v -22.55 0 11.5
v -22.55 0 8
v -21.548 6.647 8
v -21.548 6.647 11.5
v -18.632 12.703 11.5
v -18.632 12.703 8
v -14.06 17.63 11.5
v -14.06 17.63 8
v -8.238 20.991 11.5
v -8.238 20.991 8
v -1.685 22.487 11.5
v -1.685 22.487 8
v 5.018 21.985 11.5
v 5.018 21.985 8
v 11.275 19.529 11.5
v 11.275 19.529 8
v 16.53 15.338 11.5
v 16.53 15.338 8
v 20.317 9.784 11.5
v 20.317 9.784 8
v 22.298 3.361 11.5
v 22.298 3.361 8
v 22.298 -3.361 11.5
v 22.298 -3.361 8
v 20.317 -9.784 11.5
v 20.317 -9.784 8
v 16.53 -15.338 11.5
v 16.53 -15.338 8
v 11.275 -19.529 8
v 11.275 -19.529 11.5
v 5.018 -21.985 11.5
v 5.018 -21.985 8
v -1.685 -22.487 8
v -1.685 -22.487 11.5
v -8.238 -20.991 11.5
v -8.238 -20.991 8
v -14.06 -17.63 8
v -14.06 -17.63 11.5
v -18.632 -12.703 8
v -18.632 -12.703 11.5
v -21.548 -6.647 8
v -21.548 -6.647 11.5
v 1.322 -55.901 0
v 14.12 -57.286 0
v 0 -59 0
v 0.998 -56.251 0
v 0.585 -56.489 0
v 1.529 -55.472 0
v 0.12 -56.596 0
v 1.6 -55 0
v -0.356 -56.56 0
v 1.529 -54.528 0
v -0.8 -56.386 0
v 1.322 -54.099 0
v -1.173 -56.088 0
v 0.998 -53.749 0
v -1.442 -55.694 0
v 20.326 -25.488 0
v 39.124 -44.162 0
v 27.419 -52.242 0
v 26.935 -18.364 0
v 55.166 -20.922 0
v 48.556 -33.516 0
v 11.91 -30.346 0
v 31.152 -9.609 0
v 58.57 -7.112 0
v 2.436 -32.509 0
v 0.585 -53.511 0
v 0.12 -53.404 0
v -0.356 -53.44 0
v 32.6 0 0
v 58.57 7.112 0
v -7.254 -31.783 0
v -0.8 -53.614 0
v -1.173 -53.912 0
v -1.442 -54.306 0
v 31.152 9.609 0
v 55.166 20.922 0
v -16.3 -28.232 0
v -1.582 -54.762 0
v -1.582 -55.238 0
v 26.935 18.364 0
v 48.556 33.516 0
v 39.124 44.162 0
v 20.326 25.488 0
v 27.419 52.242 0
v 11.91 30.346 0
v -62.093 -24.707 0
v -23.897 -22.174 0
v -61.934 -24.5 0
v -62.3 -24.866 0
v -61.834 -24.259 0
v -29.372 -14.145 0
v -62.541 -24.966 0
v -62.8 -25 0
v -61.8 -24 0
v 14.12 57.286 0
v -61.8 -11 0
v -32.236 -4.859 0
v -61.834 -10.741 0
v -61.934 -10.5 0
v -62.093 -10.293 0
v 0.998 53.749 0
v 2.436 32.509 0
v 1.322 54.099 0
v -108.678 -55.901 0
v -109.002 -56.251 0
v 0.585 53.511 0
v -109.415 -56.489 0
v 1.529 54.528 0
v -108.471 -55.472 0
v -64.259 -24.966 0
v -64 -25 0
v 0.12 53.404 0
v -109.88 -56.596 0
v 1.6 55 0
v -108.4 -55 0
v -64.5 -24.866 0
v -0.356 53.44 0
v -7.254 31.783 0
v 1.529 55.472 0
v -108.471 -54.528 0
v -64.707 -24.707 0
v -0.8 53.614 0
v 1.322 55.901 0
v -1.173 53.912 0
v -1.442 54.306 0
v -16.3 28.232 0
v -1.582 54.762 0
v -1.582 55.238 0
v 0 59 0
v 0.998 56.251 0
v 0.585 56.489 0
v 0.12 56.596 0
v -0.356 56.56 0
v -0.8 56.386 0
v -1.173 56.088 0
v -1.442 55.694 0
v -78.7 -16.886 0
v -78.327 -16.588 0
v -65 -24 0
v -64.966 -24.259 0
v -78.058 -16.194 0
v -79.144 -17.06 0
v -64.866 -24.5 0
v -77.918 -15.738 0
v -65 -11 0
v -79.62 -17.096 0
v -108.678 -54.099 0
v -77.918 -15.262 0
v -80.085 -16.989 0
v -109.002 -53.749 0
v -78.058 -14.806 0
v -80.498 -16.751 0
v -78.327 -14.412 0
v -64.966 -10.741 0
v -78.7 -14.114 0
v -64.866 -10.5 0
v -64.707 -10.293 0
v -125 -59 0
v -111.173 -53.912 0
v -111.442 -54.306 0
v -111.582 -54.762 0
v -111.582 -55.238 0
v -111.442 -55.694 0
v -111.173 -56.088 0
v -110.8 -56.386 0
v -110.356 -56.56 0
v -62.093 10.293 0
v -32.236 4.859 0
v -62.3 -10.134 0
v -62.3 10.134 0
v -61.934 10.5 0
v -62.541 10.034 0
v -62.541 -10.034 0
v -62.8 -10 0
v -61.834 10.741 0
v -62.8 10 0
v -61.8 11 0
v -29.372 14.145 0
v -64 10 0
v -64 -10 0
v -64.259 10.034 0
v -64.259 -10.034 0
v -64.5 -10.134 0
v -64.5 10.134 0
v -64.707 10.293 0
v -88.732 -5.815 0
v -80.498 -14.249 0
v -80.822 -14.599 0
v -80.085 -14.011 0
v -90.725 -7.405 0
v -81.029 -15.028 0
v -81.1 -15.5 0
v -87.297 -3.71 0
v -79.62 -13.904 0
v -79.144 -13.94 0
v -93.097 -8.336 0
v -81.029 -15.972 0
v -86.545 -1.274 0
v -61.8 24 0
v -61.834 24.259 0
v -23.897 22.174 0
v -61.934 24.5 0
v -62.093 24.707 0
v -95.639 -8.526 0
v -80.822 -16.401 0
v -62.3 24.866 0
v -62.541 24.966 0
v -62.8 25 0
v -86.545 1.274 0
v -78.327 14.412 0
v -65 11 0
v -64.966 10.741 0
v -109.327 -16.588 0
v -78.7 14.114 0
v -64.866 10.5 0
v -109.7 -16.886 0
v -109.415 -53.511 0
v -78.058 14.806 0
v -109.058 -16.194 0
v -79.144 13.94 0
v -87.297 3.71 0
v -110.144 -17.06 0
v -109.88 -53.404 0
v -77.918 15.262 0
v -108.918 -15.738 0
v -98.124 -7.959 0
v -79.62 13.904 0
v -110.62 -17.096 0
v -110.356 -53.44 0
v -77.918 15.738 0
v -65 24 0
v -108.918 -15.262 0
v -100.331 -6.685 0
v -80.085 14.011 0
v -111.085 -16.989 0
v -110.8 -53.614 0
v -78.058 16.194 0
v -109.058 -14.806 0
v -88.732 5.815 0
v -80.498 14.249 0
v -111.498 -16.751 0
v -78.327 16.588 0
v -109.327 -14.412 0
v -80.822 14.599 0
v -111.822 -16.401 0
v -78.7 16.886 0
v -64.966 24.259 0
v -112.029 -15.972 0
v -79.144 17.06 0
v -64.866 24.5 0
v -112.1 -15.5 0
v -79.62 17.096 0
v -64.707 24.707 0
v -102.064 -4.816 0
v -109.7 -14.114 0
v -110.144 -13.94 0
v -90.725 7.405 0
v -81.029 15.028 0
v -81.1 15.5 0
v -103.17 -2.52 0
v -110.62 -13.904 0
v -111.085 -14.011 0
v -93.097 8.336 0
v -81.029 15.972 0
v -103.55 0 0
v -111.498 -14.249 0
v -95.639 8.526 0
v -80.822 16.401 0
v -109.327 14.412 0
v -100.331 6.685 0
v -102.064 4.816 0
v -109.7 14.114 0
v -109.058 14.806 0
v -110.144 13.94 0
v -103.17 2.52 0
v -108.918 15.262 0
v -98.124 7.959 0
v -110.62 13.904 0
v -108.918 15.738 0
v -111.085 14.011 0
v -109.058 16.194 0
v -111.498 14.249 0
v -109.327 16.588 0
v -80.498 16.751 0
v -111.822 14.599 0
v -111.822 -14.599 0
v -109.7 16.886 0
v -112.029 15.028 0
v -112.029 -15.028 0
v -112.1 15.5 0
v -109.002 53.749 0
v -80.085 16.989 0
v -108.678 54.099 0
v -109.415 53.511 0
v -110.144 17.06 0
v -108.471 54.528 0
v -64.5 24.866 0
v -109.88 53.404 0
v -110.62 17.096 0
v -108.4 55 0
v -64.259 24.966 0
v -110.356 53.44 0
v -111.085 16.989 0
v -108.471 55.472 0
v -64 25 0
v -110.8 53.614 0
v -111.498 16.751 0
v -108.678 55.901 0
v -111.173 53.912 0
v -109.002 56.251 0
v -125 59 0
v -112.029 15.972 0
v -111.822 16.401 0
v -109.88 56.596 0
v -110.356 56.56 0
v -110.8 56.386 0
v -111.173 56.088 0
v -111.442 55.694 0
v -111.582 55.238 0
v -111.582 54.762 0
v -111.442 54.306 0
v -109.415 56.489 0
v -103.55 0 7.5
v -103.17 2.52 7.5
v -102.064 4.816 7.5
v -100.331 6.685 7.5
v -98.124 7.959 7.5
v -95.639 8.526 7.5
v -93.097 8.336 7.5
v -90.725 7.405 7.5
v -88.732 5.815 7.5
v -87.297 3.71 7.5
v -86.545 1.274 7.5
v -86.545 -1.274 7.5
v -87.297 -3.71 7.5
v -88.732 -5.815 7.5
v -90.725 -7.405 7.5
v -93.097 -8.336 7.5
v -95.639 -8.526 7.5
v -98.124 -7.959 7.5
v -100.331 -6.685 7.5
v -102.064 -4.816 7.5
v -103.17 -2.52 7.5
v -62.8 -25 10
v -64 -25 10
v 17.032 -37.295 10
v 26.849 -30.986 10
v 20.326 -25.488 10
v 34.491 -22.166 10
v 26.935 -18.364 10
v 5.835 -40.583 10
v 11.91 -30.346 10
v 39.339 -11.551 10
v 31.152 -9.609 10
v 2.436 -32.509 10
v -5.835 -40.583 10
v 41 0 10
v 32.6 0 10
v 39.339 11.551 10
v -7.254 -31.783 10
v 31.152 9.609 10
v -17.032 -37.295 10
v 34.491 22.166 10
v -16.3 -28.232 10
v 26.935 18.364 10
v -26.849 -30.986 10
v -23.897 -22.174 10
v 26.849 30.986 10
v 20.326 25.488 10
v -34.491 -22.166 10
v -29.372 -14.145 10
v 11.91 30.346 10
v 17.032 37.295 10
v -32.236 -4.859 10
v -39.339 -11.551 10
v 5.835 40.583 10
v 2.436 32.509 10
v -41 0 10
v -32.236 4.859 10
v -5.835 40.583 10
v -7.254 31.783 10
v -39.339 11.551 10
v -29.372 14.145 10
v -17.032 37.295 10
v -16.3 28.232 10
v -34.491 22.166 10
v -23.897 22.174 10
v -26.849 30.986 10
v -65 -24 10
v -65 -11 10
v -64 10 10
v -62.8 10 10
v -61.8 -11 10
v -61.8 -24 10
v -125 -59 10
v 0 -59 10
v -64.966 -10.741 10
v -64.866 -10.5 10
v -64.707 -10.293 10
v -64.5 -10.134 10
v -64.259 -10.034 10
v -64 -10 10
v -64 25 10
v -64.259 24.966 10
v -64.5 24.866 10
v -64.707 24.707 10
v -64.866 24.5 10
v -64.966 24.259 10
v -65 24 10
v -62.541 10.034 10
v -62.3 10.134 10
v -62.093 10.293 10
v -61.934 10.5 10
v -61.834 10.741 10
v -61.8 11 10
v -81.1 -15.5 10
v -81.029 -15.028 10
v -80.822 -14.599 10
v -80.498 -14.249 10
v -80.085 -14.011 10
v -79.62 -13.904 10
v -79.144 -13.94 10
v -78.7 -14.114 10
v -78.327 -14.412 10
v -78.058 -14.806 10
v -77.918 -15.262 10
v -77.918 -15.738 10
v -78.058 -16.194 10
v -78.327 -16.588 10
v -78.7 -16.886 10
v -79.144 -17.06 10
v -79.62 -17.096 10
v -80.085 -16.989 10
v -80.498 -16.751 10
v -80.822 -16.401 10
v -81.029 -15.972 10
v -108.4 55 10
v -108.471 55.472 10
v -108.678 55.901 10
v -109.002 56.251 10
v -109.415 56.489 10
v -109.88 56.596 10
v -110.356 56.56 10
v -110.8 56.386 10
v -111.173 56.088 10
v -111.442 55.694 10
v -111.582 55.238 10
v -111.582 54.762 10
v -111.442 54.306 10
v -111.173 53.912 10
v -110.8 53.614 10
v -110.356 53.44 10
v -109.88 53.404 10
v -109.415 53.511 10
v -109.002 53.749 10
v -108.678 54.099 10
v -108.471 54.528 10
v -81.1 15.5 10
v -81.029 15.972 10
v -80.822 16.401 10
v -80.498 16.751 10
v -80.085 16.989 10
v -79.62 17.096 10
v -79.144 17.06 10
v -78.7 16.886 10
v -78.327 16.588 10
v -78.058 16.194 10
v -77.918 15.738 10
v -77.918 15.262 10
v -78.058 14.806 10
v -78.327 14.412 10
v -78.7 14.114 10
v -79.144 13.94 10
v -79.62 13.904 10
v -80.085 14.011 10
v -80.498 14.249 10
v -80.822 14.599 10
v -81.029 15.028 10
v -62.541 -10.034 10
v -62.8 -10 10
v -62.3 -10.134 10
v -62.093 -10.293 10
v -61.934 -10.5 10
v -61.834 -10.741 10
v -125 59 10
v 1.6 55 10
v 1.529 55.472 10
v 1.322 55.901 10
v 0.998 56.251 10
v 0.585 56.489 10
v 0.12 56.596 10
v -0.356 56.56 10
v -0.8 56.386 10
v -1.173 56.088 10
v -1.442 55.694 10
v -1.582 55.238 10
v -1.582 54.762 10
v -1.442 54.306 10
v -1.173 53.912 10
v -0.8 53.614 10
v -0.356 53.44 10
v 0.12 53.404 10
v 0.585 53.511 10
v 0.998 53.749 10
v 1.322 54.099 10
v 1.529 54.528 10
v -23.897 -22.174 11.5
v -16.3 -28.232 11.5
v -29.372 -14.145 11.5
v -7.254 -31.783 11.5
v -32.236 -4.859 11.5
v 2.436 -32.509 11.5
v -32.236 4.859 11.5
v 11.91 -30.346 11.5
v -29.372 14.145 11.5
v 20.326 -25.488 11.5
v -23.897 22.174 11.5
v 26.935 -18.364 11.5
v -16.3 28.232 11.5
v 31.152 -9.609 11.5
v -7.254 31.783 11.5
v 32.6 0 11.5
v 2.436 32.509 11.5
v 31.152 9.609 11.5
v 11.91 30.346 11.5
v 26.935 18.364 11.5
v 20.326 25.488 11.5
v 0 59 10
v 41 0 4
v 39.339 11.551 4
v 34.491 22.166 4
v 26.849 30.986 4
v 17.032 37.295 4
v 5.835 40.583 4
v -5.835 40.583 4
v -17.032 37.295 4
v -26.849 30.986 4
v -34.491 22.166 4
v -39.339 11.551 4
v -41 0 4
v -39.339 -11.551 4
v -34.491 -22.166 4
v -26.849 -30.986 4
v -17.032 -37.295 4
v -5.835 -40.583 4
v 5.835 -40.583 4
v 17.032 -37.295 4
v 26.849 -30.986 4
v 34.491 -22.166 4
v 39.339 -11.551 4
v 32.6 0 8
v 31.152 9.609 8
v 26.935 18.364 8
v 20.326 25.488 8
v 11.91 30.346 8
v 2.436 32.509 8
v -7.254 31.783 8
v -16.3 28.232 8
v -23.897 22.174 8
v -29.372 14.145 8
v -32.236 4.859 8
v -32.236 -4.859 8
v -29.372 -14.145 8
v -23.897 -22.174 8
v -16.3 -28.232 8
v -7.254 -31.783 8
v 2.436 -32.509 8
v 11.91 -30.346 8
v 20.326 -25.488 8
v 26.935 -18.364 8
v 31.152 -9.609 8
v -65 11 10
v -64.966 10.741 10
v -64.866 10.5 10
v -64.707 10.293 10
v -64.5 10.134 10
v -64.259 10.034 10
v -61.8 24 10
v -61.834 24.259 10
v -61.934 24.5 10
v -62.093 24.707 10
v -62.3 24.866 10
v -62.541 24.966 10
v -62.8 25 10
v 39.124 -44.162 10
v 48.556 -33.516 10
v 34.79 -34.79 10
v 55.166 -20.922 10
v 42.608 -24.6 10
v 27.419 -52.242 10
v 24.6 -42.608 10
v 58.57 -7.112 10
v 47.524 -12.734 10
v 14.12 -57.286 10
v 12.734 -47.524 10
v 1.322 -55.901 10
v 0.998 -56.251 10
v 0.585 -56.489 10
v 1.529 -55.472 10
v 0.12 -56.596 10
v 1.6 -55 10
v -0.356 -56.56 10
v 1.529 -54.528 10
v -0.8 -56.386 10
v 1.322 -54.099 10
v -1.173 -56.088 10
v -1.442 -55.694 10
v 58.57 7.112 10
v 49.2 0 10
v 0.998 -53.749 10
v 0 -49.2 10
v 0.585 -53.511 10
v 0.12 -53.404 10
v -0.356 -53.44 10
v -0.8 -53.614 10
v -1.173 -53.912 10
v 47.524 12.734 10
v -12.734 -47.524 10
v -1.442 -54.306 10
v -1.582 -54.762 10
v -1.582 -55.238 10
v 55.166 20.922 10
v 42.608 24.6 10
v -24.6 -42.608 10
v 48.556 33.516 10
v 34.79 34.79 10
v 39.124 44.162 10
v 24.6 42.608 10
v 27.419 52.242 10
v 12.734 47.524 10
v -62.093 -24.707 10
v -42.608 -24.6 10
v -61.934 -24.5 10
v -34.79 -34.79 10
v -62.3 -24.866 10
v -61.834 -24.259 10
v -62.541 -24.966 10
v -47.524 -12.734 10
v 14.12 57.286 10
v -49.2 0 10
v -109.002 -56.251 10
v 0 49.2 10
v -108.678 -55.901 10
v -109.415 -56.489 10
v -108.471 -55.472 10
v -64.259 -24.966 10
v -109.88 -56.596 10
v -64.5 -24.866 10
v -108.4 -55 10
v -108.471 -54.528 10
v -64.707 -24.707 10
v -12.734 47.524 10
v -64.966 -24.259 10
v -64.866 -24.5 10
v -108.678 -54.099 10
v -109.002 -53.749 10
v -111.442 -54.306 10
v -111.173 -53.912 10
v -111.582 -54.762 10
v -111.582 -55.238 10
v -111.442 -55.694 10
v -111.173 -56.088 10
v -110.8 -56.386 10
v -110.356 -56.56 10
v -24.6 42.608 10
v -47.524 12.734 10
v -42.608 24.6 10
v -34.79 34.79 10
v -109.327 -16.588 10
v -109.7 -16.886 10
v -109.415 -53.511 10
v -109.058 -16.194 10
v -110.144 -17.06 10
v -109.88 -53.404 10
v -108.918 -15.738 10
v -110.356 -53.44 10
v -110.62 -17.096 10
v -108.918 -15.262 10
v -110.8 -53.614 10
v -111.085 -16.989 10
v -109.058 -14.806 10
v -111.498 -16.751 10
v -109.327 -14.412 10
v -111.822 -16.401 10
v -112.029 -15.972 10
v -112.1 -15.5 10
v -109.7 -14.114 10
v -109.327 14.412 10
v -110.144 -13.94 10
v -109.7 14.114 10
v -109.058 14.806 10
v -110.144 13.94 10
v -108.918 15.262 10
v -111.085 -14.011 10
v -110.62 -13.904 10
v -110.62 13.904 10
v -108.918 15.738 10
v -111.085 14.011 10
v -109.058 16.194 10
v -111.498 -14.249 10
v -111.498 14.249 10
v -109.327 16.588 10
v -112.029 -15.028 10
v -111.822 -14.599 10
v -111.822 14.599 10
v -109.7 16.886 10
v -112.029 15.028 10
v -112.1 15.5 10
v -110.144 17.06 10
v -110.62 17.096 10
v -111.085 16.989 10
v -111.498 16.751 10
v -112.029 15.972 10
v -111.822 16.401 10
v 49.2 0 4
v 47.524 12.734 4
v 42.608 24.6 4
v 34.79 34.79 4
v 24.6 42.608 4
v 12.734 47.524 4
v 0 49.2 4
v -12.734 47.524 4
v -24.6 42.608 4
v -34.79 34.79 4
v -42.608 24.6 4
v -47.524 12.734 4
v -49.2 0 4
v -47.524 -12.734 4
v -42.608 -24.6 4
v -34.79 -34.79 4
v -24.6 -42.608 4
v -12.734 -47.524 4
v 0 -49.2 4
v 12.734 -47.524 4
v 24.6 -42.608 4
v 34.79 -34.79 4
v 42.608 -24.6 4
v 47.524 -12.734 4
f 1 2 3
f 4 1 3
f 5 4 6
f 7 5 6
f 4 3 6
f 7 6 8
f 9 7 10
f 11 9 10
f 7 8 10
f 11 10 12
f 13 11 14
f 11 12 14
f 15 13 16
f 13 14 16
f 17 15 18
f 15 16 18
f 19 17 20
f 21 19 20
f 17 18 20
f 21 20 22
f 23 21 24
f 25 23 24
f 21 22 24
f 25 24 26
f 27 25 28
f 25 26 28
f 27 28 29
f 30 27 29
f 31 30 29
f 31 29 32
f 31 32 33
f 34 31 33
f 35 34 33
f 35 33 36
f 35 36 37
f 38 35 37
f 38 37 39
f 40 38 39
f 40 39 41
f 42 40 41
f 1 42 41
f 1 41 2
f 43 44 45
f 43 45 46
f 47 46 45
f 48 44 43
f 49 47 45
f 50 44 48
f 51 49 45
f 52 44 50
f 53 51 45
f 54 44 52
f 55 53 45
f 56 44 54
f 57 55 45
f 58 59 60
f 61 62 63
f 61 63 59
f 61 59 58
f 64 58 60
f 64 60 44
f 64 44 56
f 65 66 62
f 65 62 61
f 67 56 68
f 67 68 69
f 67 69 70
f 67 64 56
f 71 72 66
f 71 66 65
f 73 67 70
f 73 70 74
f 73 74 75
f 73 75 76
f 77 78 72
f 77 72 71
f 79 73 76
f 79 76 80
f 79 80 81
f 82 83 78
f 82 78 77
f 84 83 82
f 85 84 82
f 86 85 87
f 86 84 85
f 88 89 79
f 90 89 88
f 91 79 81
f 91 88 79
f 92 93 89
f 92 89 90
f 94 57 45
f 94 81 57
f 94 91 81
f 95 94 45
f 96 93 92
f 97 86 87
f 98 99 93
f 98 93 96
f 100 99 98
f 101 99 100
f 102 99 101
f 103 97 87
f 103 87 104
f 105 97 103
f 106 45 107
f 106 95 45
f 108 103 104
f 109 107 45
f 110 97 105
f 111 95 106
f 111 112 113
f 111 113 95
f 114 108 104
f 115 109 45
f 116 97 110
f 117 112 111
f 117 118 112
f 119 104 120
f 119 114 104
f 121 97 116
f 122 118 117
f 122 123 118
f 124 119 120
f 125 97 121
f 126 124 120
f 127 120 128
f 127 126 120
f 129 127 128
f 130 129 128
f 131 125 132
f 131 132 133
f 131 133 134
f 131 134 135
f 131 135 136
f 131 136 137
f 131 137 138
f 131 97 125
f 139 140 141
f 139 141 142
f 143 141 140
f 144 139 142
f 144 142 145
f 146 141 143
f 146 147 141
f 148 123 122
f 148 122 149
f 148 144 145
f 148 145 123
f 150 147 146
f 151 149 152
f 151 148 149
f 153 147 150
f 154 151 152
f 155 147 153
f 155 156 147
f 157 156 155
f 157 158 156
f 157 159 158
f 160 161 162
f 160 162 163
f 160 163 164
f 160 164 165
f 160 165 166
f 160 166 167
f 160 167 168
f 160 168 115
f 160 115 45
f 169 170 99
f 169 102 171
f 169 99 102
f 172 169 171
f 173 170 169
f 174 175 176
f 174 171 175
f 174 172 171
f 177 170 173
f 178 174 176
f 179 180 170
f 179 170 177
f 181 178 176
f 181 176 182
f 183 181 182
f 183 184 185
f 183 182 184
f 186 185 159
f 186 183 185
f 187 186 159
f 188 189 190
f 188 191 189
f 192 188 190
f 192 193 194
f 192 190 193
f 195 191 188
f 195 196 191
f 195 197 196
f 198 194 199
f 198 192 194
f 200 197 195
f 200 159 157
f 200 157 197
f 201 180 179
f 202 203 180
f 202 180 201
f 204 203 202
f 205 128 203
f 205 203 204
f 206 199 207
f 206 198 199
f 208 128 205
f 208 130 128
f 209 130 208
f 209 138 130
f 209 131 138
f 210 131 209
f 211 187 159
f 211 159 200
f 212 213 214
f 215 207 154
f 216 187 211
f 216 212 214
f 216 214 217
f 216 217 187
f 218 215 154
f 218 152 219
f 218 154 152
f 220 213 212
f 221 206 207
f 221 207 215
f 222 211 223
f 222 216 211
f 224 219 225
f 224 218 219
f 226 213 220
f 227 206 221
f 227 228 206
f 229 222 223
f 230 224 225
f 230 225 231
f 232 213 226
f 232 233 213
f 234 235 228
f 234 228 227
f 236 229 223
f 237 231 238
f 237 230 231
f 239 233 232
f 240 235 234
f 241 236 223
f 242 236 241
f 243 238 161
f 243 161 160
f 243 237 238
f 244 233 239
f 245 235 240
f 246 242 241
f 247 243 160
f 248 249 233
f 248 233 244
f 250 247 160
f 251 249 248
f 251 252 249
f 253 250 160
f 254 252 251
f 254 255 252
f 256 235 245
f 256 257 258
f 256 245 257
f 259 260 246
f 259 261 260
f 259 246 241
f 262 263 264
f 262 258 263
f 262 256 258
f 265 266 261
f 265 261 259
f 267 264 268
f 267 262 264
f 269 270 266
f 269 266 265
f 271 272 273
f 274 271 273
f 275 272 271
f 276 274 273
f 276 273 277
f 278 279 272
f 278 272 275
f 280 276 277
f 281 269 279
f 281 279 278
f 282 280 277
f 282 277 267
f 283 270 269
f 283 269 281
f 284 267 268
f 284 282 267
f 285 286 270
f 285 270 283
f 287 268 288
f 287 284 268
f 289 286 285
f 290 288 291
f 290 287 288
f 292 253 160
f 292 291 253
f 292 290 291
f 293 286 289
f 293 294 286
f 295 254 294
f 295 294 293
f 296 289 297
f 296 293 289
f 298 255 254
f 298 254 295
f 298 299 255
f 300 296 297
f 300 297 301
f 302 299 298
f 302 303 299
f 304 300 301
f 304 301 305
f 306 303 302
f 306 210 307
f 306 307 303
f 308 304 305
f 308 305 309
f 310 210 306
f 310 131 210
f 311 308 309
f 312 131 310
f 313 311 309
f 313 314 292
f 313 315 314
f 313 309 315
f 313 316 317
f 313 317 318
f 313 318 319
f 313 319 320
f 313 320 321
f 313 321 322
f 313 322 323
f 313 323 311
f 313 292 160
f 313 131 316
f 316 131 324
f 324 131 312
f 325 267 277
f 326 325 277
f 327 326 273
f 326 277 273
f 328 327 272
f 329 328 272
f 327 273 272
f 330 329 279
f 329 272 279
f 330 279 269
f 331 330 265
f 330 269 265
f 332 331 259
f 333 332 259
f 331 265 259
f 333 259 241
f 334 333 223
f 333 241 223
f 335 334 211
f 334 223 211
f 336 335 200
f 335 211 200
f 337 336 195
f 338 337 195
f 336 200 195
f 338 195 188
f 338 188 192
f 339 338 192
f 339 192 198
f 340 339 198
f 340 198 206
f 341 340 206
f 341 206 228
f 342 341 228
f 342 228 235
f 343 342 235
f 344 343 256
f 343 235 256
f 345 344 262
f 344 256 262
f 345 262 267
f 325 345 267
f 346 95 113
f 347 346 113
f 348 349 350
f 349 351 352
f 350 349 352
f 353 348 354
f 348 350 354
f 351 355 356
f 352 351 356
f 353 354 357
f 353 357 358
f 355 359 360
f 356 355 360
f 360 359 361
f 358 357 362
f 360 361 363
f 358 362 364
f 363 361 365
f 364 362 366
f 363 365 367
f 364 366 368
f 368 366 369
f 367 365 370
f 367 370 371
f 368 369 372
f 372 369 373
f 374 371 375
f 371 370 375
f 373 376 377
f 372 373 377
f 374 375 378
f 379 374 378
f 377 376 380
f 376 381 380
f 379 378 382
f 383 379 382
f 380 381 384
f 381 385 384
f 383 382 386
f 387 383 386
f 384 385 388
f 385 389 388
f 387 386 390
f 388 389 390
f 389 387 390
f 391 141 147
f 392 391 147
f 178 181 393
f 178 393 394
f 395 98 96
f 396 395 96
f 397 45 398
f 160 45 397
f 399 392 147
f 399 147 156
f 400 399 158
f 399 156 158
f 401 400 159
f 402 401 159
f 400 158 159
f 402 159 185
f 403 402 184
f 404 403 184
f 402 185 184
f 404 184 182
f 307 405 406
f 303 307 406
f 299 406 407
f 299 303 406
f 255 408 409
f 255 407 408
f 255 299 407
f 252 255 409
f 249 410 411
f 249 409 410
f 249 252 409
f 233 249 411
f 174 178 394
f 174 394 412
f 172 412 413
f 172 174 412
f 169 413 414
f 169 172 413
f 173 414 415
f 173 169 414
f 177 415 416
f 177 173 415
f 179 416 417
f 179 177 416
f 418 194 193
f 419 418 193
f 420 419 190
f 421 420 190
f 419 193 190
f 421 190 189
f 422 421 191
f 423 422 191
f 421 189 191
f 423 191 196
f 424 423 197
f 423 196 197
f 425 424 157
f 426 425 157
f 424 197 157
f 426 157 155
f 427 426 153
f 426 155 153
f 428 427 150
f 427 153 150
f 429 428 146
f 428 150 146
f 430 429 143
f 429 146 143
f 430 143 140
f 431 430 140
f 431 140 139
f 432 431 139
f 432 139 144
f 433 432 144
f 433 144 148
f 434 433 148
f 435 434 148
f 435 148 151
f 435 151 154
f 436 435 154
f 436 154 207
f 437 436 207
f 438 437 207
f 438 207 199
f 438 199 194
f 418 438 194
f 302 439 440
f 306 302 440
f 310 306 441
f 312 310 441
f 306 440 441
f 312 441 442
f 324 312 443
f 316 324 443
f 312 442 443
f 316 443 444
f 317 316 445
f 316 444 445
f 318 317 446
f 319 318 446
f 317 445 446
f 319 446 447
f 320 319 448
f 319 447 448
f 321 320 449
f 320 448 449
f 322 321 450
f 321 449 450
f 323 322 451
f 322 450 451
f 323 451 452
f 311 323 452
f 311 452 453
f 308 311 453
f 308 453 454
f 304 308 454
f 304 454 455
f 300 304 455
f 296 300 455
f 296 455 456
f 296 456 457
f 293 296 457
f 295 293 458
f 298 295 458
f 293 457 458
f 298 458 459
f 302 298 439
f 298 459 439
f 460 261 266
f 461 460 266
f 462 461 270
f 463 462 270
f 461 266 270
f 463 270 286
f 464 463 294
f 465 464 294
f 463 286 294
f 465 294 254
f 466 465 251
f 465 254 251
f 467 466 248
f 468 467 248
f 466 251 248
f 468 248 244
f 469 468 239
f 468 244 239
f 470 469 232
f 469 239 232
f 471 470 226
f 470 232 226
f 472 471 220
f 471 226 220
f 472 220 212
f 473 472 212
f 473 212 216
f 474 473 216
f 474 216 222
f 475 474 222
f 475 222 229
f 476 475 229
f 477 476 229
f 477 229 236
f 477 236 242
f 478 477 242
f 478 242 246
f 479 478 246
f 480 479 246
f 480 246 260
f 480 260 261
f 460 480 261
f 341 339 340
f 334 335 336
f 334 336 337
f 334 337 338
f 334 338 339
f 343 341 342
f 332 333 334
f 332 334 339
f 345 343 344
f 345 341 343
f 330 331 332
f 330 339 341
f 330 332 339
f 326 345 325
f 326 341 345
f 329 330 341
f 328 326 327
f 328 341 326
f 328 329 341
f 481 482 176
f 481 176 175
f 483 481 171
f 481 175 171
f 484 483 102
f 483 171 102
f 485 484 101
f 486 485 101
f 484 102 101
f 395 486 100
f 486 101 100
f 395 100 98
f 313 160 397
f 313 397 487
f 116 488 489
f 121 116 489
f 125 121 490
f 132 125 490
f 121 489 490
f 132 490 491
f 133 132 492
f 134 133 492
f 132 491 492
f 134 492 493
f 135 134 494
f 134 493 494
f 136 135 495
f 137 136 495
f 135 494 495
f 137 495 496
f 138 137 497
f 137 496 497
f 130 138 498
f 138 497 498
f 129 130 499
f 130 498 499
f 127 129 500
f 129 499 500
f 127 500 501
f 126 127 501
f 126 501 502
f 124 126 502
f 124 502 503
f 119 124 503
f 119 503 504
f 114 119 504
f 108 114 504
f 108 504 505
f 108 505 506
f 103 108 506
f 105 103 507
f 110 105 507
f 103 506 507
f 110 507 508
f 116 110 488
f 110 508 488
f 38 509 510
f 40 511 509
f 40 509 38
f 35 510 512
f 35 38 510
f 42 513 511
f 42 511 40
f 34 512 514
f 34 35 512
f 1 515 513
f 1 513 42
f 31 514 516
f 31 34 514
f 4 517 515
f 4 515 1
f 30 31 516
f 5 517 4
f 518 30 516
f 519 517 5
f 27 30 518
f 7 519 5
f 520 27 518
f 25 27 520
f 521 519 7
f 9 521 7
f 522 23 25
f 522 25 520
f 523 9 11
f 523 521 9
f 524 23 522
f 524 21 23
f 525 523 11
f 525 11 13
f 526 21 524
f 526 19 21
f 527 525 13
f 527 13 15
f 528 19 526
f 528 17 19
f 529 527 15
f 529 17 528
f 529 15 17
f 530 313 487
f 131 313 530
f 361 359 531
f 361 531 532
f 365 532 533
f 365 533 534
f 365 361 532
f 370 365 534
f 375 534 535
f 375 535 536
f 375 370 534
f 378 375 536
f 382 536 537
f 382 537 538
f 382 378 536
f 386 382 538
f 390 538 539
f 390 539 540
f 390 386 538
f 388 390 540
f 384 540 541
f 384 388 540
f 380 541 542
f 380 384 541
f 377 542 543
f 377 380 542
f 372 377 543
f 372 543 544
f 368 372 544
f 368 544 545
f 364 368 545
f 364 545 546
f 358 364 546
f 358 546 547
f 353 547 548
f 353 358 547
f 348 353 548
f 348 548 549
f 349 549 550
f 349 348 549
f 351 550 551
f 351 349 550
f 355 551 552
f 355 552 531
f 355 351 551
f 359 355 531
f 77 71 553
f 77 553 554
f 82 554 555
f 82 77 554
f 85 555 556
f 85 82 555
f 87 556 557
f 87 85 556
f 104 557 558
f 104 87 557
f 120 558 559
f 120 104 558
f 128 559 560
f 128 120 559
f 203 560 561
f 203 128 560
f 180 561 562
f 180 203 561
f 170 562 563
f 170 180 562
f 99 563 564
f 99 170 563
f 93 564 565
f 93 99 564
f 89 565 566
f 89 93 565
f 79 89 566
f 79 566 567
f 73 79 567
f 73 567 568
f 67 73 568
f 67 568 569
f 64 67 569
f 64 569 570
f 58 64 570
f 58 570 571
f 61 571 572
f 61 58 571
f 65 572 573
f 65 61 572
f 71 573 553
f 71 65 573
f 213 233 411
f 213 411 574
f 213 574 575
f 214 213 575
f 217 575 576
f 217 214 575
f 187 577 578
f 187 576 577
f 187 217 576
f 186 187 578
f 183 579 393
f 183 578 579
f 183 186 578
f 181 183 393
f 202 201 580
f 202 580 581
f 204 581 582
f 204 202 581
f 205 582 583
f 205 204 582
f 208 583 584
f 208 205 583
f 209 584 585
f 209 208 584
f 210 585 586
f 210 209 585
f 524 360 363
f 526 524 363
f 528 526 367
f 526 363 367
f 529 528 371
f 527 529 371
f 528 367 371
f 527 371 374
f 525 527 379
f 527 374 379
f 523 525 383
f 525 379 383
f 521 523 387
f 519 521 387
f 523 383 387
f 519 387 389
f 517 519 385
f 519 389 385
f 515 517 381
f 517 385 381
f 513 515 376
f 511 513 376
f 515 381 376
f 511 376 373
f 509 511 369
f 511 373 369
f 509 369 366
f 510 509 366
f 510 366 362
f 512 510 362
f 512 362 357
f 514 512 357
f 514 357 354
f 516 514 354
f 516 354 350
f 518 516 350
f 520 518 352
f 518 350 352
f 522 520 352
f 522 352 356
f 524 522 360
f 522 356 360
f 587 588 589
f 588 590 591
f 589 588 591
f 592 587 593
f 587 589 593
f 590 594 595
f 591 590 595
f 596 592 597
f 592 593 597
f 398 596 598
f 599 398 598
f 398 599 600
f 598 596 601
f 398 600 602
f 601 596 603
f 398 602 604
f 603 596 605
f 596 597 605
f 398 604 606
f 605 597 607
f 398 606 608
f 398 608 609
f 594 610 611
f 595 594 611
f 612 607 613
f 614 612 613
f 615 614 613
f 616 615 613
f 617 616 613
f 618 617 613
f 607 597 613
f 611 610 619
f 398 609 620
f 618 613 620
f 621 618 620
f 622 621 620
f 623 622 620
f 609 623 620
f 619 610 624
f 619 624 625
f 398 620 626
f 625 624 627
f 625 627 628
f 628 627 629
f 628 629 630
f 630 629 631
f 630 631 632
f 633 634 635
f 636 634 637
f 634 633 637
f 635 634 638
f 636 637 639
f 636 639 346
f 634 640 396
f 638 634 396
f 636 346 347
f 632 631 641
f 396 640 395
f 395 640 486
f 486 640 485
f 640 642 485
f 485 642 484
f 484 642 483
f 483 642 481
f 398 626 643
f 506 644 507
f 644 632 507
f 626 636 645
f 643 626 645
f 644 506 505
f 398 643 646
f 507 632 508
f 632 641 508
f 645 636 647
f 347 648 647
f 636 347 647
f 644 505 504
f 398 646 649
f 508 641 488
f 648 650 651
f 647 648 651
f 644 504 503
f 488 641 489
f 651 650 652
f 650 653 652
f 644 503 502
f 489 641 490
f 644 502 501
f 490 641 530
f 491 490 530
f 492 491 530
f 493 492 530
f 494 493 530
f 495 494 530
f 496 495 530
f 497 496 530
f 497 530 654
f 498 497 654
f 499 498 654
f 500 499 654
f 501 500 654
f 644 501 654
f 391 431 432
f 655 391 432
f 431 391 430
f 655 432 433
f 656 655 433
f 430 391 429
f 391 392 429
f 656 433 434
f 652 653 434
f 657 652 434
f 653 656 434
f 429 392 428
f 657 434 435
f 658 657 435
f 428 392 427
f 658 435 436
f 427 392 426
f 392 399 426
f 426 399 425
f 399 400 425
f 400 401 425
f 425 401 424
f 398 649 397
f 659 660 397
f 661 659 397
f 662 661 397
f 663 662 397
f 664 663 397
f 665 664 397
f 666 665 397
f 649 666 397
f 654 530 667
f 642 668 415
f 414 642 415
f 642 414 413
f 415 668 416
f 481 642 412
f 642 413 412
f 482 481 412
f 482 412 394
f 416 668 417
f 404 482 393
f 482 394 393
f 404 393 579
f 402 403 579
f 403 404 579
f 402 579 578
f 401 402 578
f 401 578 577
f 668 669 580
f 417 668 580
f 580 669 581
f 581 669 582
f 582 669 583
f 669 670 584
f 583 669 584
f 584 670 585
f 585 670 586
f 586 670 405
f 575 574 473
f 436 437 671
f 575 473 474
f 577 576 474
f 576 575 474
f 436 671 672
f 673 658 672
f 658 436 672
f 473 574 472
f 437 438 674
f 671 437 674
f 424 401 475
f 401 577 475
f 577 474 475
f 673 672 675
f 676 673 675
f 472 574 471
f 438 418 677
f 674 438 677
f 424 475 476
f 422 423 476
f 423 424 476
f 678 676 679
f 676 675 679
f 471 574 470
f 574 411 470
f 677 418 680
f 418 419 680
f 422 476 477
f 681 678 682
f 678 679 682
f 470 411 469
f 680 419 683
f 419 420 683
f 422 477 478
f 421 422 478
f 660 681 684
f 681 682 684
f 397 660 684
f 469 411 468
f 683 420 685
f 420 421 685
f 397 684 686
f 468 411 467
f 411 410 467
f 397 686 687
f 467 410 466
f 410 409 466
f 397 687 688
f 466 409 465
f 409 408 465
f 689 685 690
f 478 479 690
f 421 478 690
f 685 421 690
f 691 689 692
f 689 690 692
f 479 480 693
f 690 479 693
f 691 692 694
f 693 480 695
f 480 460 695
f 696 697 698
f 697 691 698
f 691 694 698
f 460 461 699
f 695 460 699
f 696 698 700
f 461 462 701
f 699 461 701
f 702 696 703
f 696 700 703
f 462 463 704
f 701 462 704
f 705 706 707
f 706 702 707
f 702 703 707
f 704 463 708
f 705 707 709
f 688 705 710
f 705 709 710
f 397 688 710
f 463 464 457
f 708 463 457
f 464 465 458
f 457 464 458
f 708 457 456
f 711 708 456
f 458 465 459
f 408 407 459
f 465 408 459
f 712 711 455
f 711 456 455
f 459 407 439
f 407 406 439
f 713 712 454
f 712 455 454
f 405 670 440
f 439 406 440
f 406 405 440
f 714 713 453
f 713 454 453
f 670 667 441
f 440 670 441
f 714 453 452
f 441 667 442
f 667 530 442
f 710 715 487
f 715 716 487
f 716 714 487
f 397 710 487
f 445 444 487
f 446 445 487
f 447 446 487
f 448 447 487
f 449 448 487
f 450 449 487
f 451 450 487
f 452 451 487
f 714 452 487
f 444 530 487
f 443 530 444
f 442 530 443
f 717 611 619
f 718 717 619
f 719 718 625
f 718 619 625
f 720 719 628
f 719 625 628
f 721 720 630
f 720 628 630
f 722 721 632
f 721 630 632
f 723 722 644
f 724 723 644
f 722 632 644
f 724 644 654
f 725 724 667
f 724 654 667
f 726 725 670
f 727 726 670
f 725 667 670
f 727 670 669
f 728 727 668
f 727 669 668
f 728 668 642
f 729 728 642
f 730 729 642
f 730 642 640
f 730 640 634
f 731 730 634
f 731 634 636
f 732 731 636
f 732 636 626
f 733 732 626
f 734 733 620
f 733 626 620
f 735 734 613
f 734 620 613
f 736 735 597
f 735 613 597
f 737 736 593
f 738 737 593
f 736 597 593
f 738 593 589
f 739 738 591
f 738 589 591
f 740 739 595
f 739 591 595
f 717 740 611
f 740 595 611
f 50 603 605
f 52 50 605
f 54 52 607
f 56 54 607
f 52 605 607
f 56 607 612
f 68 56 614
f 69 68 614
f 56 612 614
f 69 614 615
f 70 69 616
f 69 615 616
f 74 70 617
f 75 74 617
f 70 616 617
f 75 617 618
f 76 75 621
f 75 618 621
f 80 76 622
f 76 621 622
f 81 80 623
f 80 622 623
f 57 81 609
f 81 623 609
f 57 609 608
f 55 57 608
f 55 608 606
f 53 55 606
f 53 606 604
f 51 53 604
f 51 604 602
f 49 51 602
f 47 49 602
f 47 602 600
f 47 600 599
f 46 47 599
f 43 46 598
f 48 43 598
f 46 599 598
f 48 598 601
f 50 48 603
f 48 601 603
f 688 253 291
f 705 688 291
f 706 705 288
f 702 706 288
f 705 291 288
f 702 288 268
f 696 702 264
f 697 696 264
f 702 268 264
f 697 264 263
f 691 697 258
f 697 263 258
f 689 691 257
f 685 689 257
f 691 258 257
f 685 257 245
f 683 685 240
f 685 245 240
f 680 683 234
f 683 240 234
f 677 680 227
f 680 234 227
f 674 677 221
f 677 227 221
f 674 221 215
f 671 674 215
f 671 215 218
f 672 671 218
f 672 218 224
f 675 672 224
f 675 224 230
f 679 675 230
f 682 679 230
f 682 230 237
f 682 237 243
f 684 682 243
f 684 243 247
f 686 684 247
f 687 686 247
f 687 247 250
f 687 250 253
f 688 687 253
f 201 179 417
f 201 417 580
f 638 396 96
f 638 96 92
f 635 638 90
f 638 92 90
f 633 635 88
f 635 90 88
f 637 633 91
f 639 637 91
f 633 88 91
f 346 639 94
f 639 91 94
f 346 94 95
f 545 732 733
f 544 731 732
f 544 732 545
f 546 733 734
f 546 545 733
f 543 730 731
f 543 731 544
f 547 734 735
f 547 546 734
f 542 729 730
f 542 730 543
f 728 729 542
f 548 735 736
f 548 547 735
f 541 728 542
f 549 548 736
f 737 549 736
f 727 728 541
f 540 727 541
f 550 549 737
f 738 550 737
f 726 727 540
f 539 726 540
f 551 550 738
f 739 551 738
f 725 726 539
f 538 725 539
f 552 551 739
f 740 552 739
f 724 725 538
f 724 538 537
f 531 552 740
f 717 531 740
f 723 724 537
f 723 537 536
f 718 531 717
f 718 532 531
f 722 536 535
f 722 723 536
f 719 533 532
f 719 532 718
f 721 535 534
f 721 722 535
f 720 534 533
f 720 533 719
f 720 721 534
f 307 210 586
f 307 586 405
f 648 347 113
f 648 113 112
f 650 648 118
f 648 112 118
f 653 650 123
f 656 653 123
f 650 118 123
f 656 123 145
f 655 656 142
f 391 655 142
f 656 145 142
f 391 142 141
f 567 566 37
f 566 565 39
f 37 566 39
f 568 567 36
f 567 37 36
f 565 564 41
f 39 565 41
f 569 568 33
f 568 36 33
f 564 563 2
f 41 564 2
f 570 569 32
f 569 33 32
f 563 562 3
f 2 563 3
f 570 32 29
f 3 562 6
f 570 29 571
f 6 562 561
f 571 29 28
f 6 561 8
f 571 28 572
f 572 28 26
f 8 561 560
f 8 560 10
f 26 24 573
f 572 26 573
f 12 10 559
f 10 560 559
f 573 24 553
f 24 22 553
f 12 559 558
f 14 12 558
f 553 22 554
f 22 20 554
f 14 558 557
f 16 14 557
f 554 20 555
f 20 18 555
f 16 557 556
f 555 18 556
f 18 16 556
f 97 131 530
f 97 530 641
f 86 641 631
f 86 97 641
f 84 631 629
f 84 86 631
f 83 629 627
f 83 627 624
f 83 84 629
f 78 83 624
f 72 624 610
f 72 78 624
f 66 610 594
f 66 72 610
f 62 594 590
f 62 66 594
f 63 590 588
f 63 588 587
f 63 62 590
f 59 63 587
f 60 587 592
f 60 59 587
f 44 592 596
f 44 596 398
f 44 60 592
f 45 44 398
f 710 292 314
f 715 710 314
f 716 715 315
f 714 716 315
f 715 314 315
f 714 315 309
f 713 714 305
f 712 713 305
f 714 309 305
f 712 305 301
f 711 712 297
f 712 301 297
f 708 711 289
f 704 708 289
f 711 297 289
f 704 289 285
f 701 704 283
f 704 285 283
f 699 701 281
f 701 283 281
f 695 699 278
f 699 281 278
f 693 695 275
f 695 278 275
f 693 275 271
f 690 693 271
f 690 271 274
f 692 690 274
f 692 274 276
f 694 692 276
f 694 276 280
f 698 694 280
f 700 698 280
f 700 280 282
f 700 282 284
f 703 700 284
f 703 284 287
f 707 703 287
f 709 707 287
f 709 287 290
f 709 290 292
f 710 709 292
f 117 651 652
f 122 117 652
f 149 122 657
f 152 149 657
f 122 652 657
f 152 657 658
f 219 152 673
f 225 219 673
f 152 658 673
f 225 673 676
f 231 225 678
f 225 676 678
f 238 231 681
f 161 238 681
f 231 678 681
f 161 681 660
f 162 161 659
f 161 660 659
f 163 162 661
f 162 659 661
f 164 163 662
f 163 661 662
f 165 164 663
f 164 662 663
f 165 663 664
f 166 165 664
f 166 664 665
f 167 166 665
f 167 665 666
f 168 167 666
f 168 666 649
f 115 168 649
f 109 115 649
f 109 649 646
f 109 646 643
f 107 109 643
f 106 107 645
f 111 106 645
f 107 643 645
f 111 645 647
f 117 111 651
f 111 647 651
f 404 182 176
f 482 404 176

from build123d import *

# Parameters (mm, degrees)
BOSS_EXTRUDE1_DEPTH = 10
SKETCH2_R           = 32.6
BOSS_EXTRUDE2_DEPTH = 1.5
CUT_EXTRUDE1_START  = -10
SKETCH3_R           = 32.6
SKETCH3_R_2         = 22.5
CUT_EXTRUDE1_DEPTH  = 8
SKETCH6_R           = 1.6
CUT_EXTRUDE4_DEPTH  = 10
SKETCH7_R           = 8.55
CUT_EXTRUDE5_DEPTH  = 7.5
SKETCH5_R           = 49.2
SKETCH5_R_2         = 41
CUT_EXTRUDE7_DEPTH  = 6
SKETCH9_R           = 1.6
CUT_EXTRUDE8_DEPTH  = 139.702018731
SKETCH10_R          = 22.55
CUT_EXTRUDE9_DEPTH  = 139.702018731
CUT_EXTRUDE10_DEPTH = 139.702018731


with BuildPart() as part:
    # Sketch1 → Boss-Extrude1 (new body)
    with BuildSketch(Plane.XY):
        with BuildLine():
            Line((-125, 59), (0, 59))
            ThreePointArc((0, 59), (59, 0), (0, -59))
            Line((0, -59), (-125, -59))
            Line((-125, -59), (-125, 59))
        make_face()
    extrude(amount=BOSS_EXTRUDE1_DEPTH)

    # Sketch2 → Boss-Extrude2 (add)
    with BuildSketch(Plane.XY.offset(10)):
        Circle(SKETCH2_R)
    extrude(amount=BOSS_EXTRUDE2_DEPTH)

    # Sketch3 → Cut-Extrude1 (cut)
    with BuildSketch(Plane.XY.offset(10).offset(CUT_EXTRUDE1_START)):
        Circle(SKETCH3_R)
        Circle(SKETCH3_R_2, mode=Mode.SUBTRACT)
    extrude(amount=CUT_EXTRUDE1_DEPTH, mode=Mode.SUBTRACT)

    # Sketch6 → Cut-Extrude4 (cut)
    with BuildSketch(Plane.XY.offset(10)):
        with Locations((0, -55)):
            Circle(SKETCH6_R)
        with Locations((-110, -55)):
            Circle(SKETCH6_R)
        with Locations((-110, 55)):
            Circle(SKETCH6_R)
        with Locations((0, 55)):
            Circle(SKETCH6_R)
    extrude(amount=-CUT_EXTRUDE4_DEPTH, mode=Mode.SUBTRACT)

    # Sketch7 → Cut-Extrude5 (cut)
    with BuildSketch(Plane(origin=(0, 0, 0), x_dir=(-1, 0, 0), z_dir=(0, 0, -1))):
        with Locations((95, 0)):
            Circle(SKETCH7_R)
    extrude(amount=-CUT_EXTRUDE5_DEPTH, mode=Mode.SUBTRACT)

    # Sketch5 → Cut-Extrude7 (cut)
    with BuildSketch(Plane.XY.offset(10)):
        Circle(SKETCH5_R)
        Circle(SKETCH5_R_2, mode=Mode.SUBTRACT)
    extrude(amount=-CUT_EXTRUDE7_DEPTH, mode=Mode.SUBTRACT)

    # Sketch9 → Cut-Extrude8 (cut, through all)
    with BuildSketch(Plane(origin=(0, 0, 0), x_dir=(-1, 0, 0), z_dir=(0, 0, -1))):
        with Locations((79.5, -15.5)):
            Circle(SKETCH9_R)
        with Locations((79.5, 15.5)):
            Circle(SKETCH9_R)
        with Locations((110.5, 15.5)):
            Circle(SKETCH9_R)
        with Locations((110.5, -15.5)):
            Circle(SKETCH9_R)
    extrude(amount=-CUT_EXTRUDE8_DEPTH, mode=Mode.SUBTRACT)

    # Sketch10 → Cut-Extrude9 (cut, through all)
    with BuildSketch(Plane(origin=(0, 0, 0), x_dir=(-1, 0, 0), z_dir=(0, 0, -1))):
        Circle(SKETCH10_R)
    extrude(amount=-CUT_EXTRUDE9_DEPTH, mode=Mode.SUBTRACT)

    # Sketch11 → Cut-Extrude10 (cut, through all)
    with BuildSketch(Plane(origin=(0, 0, 0), x_dir=(-1, 0, 0), z_dir=(0, 0, -1))):
        with BuildLine():
            Line((65, -24), (65, -11))
            ThreePointArc((65, -11), (64.707106781, -10.292893219), (64, -10))
            Line((64, -10), (62.8, -10))
            ThreePointArc((62.8, -10), (62.092893219, -10.292893219), (61.8, -11))
            Line((61.8, -11), (61.8, -24))
            ThreePointArc((61.8, -24), (62.092893219, -24.707106781), (62.8, -25))
            Line((62.8, -25), (64, -25))
            ThreePointArc((64, -25), (64.707106781, -24.707106781), (65, -24))
        make_face()
        with BuildLine():
            Line((62.8, 25), (64, 25))
            ThreePointArc((64, 25), (64.707106781, 24.707106781), (65, 24))
            Line((65, 24), (65, 11))
            ThreePointArc((65, 11), (64.707106781, 10.292893219), (64, 10))
            Line((64, 10), (62.8, 10))
            ThreePointArc((62.8, 10), (62.092893219, 10.292893219), (61.8, 11))
            Line((61.8, 11), (61.8, 24))
            ThreePointArc((61.8, 24), (62.092893219, 24.707106781), (62.8, 25))
        make_face()
    extrude(amount=-CUT_EXTRUDE10_DEPTH, mode=Mode.SUBTRACT)


solid = part.part
